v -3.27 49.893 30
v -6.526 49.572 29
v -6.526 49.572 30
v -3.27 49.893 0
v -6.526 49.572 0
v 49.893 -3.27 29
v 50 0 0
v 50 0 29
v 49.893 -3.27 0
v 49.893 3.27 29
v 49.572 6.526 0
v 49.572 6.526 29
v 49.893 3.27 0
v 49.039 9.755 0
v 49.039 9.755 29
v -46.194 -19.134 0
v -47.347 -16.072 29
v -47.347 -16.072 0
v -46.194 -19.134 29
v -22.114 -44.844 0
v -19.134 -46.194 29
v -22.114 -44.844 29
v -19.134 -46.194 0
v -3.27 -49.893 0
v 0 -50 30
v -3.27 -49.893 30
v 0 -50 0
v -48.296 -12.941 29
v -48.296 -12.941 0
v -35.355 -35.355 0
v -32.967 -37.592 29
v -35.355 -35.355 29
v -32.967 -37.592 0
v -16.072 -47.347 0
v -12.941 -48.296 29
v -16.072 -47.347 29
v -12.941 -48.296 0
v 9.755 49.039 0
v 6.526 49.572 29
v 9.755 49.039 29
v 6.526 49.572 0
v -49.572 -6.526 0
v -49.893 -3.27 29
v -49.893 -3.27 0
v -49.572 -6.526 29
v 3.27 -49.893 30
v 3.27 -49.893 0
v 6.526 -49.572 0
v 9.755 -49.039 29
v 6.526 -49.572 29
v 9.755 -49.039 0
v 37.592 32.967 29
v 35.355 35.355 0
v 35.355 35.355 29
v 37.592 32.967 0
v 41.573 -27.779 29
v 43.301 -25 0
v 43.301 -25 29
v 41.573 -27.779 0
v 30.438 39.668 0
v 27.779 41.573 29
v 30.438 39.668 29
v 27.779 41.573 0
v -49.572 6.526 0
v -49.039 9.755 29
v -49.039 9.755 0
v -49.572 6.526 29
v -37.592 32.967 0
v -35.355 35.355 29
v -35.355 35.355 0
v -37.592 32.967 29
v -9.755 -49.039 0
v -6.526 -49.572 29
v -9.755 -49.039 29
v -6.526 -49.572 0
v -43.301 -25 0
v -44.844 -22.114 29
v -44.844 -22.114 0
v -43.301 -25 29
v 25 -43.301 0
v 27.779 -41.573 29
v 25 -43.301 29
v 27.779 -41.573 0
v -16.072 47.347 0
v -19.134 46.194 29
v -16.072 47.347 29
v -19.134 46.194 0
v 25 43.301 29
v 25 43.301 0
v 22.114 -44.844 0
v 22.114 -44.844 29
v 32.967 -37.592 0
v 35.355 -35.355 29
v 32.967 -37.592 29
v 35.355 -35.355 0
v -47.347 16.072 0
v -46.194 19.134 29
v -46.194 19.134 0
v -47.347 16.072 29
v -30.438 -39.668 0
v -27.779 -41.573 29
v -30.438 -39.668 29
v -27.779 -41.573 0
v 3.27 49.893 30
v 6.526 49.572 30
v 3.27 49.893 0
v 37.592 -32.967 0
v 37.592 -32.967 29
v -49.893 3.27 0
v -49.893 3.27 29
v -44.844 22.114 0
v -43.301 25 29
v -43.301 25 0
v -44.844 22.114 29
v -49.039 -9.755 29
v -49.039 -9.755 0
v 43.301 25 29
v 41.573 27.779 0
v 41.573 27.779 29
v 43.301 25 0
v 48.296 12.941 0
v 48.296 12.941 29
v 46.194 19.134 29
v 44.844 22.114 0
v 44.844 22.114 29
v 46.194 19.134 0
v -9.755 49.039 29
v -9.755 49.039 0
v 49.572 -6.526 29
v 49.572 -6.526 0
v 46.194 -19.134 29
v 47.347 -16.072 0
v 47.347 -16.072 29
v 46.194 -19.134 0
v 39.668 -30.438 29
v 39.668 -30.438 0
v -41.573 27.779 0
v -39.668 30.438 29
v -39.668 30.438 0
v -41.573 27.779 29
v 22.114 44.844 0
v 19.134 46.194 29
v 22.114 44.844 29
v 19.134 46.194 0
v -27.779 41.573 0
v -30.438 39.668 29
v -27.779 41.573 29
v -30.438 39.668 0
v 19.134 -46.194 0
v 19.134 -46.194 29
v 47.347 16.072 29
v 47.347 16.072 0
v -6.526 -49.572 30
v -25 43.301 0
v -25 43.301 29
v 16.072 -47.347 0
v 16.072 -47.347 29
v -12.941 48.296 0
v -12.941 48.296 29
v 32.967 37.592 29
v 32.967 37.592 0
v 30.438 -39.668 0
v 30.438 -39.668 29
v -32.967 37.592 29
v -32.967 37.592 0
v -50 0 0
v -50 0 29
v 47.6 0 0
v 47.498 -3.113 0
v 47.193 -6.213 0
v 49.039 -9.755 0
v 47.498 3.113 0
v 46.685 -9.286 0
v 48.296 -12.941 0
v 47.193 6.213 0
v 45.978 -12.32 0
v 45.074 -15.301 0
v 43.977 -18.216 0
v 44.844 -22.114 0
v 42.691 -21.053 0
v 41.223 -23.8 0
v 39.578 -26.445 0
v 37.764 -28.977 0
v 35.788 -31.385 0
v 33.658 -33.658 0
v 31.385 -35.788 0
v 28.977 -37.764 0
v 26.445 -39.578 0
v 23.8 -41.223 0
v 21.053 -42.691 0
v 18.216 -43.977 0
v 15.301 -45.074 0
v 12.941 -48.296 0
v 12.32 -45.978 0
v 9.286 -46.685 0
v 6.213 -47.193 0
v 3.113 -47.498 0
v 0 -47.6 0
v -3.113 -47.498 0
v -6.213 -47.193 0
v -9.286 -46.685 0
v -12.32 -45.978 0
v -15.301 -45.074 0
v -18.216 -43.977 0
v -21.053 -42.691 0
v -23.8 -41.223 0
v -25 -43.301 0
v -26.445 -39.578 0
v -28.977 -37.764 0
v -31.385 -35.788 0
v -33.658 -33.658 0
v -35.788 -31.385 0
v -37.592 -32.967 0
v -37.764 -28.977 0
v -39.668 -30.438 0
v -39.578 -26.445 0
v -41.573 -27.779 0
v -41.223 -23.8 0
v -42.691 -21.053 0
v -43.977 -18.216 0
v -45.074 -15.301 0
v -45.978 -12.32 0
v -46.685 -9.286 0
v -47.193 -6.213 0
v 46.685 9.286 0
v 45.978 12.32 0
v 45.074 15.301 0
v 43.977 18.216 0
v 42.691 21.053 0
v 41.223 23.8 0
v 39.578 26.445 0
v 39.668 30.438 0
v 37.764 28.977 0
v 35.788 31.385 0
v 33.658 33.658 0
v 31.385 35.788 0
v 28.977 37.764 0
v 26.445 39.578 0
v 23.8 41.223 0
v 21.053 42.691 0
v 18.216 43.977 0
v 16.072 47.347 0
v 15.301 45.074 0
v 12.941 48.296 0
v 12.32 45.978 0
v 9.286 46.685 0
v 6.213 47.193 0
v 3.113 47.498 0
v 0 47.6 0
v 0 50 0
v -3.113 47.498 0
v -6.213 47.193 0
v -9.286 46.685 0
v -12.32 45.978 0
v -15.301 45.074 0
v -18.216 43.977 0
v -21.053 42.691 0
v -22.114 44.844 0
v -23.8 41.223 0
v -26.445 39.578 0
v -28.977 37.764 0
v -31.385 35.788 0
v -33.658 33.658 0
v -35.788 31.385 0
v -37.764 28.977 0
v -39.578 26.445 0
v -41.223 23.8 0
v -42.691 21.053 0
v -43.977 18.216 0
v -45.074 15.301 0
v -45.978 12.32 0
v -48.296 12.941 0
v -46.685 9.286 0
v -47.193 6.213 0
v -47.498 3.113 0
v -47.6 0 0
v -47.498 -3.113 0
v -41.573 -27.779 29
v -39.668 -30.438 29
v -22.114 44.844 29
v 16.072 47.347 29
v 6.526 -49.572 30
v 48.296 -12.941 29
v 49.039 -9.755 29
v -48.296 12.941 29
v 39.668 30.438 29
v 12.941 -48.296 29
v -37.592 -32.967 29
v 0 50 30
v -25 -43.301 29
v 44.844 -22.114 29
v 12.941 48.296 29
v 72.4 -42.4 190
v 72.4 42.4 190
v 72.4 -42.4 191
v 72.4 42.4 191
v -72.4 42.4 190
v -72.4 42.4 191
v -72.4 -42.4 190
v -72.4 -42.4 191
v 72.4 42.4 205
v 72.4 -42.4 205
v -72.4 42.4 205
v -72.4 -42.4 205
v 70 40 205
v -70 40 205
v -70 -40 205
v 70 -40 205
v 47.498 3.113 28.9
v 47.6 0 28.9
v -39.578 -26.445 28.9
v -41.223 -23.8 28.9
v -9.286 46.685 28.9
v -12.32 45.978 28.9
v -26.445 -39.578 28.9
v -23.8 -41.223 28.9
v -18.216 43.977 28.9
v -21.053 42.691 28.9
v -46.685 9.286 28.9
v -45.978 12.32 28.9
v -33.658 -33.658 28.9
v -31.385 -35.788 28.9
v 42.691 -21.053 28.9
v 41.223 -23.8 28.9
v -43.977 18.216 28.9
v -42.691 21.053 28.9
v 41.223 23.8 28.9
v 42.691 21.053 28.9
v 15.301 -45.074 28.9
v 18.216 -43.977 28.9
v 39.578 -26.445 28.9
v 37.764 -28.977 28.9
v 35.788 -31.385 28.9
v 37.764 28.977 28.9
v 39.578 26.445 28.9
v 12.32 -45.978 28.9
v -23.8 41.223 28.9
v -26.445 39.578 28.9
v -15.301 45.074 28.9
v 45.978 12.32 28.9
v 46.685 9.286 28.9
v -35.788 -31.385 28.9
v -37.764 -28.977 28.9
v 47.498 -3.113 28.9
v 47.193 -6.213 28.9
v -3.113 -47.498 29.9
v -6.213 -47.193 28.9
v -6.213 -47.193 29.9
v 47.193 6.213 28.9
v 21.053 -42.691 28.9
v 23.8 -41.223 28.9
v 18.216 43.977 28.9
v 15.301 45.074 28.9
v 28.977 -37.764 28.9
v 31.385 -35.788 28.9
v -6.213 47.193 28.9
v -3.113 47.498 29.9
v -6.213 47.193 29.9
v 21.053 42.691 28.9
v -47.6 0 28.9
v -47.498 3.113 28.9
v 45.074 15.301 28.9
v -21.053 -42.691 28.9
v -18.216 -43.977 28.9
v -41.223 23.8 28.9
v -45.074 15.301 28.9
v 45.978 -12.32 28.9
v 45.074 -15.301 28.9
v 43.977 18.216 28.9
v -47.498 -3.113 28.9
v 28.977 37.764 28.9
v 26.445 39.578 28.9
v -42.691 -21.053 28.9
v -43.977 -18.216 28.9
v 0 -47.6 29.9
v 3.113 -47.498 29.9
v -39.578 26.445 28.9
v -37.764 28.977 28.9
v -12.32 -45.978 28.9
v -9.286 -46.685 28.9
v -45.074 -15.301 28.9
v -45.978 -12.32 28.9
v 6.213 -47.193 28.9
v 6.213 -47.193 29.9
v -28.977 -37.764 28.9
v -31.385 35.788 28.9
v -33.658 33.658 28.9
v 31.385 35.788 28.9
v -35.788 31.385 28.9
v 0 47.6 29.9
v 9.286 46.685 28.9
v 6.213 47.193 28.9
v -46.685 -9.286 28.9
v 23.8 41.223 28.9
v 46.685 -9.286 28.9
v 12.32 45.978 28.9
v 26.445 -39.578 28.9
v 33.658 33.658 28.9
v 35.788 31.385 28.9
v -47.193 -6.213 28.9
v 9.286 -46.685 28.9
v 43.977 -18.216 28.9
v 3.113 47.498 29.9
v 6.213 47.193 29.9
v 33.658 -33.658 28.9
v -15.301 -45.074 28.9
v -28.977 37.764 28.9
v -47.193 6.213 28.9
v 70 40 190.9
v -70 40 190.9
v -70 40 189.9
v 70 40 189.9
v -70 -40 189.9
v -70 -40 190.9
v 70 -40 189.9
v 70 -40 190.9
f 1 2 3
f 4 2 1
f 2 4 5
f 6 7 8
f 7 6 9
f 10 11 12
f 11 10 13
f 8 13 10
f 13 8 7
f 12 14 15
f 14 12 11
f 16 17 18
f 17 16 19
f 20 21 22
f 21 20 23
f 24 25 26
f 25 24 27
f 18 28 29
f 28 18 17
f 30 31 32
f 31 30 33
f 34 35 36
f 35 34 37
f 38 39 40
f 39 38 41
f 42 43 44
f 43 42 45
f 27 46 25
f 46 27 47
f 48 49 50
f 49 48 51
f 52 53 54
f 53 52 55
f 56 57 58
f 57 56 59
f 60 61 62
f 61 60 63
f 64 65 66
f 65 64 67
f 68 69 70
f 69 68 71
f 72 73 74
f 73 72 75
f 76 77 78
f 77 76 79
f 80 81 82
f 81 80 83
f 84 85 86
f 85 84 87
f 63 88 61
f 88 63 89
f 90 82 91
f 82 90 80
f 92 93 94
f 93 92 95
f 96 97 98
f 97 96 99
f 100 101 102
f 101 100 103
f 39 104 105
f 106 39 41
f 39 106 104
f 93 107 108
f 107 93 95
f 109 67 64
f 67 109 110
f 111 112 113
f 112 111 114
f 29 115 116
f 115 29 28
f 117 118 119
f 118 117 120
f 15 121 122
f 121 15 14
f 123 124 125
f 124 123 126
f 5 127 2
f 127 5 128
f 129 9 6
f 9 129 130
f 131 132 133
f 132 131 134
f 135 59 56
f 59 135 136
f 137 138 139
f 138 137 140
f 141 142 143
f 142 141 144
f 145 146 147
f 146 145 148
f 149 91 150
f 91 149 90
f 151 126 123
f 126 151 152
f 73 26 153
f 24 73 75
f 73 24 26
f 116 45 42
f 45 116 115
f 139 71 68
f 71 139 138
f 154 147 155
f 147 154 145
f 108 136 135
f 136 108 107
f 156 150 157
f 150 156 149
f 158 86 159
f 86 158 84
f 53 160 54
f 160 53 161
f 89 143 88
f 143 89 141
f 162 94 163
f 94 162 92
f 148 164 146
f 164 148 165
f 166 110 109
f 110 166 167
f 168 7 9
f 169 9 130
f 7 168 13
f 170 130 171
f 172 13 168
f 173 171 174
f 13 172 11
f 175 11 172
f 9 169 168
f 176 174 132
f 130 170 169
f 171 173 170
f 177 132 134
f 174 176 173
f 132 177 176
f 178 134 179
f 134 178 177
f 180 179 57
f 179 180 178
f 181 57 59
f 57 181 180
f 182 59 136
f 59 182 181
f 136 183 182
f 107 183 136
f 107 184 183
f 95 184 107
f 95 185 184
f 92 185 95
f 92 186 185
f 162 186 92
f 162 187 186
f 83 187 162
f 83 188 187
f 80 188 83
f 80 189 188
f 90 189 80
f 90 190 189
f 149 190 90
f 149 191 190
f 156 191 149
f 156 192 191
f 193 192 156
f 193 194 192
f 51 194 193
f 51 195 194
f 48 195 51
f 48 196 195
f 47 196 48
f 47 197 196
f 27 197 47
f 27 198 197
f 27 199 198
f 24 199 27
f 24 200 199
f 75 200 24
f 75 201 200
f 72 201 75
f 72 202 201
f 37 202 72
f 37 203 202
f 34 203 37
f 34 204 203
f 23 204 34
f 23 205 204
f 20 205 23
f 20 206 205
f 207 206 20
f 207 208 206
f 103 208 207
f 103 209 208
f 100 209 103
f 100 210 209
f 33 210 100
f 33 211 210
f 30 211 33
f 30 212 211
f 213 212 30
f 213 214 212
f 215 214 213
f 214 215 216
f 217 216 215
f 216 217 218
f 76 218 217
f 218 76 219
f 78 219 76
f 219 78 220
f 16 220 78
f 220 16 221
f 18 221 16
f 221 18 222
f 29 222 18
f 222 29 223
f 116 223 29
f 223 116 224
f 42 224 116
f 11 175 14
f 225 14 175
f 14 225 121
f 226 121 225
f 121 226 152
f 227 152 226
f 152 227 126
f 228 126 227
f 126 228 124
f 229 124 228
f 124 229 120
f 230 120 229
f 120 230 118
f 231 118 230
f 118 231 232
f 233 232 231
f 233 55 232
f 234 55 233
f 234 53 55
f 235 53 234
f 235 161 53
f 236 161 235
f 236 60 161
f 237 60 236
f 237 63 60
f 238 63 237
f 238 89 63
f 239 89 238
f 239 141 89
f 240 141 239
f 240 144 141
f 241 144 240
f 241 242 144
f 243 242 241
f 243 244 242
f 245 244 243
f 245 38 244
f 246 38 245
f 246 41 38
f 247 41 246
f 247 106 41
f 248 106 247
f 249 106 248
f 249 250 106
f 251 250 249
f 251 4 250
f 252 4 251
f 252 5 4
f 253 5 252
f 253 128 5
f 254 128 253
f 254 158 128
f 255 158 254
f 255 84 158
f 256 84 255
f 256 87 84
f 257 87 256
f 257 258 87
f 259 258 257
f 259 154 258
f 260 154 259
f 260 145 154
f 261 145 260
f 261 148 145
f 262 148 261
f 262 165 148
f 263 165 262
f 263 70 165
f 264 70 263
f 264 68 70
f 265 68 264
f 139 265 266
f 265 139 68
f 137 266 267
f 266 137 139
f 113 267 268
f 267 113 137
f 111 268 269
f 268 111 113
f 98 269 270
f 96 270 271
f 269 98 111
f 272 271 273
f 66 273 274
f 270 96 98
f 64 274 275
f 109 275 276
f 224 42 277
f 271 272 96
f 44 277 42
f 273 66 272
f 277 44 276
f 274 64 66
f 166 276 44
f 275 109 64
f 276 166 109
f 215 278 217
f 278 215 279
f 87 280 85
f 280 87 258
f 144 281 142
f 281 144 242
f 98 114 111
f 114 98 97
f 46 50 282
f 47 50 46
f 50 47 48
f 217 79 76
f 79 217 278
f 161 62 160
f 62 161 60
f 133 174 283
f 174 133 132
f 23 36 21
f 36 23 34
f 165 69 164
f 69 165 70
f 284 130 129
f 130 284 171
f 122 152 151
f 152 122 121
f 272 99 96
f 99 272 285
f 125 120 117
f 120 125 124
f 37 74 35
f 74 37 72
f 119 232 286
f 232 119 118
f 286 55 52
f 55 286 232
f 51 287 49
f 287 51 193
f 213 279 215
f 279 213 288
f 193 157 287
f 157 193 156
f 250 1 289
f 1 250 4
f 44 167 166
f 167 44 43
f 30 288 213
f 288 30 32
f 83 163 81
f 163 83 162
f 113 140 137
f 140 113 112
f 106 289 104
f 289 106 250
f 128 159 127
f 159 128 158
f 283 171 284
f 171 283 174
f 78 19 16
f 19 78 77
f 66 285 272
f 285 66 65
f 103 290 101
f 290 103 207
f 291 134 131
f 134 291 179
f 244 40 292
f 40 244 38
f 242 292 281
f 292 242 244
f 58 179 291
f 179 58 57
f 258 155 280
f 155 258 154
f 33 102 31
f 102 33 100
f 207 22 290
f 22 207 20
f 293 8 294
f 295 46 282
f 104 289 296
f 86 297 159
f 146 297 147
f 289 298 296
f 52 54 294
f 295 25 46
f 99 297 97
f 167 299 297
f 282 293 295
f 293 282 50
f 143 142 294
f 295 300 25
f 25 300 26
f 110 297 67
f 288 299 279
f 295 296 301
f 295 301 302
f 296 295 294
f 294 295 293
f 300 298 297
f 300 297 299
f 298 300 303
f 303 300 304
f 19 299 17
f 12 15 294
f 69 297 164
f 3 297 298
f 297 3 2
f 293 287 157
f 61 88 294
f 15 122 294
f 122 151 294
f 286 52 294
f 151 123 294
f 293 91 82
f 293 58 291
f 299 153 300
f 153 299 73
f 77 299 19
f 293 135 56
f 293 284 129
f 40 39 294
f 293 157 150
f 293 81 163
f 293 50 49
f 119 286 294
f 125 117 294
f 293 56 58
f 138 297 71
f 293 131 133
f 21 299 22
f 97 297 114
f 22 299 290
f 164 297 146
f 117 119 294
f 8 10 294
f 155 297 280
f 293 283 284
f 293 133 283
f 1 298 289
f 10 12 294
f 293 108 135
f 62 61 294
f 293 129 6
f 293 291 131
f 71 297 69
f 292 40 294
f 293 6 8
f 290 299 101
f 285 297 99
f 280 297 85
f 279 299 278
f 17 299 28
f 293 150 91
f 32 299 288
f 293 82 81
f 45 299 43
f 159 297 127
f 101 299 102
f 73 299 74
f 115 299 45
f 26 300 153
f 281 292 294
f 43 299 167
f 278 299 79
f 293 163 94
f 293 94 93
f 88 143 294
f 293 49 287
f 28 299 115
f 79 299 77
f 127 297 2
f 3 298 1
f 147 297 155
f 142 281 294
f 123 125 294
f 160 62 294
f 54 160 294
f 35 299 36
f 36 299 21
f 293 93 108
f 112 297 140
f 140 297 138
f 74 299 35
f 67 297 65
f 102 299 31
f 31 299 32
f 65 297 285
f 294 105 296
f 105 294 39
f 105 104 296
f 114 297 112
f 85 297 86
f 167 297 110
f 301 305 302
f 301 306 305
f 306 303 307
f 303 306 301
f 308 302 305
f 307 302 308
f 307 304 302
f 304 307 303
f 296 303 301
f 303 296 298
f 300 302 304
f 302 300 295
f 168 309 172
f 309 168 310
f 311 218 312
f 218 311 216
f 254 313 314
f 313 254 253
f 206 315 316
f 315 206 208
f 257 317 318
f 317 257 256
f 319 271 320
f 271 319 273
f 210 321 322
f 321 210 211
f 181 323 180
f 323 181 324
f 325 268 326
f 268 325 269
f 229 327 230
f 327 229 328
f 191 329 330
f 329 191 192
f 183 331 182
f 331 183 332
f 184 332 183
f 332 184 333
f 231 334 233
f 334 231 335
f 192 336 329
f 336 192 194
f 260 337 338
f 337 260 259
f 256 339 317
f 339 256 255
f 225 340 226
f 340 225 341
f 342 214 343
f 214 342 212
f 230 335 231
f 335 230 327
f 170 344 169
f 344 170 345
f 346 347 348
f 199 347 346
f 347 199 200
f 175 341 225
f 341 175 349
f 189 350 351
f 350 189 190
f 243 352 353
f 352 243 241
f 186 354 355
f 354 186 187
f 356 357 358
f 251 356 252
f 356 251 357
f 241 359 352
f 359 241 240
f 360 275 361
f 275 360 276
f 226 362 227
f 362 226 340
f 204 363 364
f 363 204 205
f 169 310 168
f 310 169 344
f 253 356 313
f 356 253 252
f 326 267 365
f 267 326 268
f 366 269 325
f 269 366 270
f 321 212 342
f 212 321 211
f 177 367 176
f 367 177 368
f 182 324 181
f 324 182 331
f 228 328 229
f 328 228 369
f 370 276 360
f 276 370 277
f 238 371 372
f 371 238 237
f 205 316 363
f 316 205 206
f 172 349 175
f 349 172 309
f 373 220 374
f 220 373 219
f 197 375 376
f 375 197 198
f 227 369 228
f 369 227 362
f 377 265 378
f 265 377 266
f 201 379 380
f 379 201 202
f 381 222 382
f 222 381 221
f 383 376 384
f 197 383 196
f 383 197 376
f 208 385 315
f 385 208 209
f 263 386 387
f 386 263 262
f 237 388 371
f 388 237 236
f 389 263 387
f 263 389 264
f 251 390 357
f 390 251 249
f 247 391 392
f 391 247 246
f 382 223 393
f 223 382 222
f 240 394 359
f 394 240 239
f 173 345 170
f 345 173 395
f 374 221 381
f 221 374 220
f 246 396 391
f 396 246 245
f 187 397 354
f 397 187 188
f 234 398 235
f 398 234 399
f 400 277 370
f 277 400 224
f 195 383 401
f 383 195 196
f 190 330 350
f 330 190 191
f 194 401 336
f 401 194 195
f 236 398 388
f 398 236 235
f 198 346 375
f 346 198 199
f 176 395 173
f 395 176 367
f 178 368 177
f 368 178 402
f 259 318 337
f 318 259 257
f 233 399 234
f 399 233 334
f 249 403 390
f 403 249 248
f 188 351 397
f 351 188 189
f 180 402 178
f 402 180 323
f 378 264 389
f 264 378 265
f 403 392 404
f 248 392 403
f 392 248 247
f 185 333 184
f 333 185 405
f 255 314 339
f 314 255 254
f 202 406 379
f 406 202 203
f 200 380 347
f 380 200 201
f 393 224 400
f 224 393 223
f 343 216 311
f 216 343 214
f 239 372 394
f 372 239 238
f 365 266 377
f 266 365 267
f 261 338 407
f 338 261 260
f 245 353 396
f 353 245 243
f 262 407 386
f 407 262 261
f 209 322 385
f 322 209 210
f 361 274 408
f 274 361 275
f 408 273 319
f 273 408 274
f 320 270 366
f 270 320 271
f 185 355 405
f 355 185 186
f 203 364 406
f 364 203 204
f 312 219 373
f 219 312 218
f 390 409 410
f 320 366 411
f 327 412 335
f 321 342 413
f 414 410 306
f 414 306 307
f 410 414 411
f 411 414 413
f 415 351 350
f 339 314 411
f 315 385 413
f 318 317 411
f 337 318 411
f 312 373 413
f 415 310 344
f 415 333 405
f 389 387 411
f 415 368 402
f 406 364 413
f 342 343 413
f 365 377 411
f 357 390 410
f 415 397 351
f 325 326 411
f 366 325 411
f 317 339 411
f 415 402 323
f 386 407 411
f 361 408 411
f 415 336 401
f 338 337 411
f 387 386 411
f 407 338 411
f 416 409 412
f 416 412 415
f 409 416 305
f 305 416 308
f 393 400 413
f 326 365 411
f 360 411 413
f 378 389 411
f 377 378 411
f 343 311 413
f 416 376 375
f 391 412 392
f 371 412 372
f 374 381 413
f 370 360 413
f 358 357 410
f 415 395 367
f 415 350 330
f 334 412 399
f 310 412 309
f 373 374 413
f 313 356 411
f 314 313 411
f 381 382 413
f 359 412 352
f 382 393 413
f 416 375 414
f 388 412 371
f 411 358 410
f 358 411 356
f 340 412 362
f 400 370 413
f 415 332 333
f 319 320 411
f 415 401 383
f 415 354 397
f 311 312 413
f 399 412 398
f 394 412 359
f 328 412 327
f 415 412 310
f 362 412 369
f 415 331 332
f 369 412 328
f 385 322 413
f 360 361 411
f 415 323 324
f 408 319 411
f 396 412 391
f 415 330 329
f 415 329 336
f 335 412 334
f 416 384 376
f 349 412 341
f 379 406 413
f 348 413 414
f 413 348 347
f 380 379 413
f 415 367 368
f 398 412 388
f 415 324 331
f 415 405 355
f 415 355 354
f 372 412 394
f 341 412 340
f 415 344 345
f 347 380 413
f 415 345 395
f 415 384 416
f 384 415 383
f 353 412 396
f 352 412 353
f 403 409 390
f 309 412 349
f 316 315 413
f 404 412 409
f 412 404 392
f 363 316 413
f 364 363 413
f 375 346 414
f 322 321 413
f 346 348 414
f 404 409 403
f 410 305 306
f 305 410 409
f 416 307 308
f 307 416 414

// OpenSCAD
// Millimetres. Approximate hull representation; exact BRep/STL from make_cad.py.
wall=2.4; W=140; H=80; OD=100; L=205; $fn=96;
module shape(r,w,h) {
 cylinder(h=30,r=r);
 hull(){translate([0,0,29]) cylinder(h=1,r=r); translate([-w/2,-h/2,190]) cube([w,h,1]);}
 translate([-w/2,-h/2,190]) cube([w,h,15]);
}
difference(){shape(OD/2,W+2*wall,H+2*wall);translate([0,0,-0.1])shape(OD/2-wall,W,H);translate([-W/2,-H/2,204.8])cube([W,H,1]);}
